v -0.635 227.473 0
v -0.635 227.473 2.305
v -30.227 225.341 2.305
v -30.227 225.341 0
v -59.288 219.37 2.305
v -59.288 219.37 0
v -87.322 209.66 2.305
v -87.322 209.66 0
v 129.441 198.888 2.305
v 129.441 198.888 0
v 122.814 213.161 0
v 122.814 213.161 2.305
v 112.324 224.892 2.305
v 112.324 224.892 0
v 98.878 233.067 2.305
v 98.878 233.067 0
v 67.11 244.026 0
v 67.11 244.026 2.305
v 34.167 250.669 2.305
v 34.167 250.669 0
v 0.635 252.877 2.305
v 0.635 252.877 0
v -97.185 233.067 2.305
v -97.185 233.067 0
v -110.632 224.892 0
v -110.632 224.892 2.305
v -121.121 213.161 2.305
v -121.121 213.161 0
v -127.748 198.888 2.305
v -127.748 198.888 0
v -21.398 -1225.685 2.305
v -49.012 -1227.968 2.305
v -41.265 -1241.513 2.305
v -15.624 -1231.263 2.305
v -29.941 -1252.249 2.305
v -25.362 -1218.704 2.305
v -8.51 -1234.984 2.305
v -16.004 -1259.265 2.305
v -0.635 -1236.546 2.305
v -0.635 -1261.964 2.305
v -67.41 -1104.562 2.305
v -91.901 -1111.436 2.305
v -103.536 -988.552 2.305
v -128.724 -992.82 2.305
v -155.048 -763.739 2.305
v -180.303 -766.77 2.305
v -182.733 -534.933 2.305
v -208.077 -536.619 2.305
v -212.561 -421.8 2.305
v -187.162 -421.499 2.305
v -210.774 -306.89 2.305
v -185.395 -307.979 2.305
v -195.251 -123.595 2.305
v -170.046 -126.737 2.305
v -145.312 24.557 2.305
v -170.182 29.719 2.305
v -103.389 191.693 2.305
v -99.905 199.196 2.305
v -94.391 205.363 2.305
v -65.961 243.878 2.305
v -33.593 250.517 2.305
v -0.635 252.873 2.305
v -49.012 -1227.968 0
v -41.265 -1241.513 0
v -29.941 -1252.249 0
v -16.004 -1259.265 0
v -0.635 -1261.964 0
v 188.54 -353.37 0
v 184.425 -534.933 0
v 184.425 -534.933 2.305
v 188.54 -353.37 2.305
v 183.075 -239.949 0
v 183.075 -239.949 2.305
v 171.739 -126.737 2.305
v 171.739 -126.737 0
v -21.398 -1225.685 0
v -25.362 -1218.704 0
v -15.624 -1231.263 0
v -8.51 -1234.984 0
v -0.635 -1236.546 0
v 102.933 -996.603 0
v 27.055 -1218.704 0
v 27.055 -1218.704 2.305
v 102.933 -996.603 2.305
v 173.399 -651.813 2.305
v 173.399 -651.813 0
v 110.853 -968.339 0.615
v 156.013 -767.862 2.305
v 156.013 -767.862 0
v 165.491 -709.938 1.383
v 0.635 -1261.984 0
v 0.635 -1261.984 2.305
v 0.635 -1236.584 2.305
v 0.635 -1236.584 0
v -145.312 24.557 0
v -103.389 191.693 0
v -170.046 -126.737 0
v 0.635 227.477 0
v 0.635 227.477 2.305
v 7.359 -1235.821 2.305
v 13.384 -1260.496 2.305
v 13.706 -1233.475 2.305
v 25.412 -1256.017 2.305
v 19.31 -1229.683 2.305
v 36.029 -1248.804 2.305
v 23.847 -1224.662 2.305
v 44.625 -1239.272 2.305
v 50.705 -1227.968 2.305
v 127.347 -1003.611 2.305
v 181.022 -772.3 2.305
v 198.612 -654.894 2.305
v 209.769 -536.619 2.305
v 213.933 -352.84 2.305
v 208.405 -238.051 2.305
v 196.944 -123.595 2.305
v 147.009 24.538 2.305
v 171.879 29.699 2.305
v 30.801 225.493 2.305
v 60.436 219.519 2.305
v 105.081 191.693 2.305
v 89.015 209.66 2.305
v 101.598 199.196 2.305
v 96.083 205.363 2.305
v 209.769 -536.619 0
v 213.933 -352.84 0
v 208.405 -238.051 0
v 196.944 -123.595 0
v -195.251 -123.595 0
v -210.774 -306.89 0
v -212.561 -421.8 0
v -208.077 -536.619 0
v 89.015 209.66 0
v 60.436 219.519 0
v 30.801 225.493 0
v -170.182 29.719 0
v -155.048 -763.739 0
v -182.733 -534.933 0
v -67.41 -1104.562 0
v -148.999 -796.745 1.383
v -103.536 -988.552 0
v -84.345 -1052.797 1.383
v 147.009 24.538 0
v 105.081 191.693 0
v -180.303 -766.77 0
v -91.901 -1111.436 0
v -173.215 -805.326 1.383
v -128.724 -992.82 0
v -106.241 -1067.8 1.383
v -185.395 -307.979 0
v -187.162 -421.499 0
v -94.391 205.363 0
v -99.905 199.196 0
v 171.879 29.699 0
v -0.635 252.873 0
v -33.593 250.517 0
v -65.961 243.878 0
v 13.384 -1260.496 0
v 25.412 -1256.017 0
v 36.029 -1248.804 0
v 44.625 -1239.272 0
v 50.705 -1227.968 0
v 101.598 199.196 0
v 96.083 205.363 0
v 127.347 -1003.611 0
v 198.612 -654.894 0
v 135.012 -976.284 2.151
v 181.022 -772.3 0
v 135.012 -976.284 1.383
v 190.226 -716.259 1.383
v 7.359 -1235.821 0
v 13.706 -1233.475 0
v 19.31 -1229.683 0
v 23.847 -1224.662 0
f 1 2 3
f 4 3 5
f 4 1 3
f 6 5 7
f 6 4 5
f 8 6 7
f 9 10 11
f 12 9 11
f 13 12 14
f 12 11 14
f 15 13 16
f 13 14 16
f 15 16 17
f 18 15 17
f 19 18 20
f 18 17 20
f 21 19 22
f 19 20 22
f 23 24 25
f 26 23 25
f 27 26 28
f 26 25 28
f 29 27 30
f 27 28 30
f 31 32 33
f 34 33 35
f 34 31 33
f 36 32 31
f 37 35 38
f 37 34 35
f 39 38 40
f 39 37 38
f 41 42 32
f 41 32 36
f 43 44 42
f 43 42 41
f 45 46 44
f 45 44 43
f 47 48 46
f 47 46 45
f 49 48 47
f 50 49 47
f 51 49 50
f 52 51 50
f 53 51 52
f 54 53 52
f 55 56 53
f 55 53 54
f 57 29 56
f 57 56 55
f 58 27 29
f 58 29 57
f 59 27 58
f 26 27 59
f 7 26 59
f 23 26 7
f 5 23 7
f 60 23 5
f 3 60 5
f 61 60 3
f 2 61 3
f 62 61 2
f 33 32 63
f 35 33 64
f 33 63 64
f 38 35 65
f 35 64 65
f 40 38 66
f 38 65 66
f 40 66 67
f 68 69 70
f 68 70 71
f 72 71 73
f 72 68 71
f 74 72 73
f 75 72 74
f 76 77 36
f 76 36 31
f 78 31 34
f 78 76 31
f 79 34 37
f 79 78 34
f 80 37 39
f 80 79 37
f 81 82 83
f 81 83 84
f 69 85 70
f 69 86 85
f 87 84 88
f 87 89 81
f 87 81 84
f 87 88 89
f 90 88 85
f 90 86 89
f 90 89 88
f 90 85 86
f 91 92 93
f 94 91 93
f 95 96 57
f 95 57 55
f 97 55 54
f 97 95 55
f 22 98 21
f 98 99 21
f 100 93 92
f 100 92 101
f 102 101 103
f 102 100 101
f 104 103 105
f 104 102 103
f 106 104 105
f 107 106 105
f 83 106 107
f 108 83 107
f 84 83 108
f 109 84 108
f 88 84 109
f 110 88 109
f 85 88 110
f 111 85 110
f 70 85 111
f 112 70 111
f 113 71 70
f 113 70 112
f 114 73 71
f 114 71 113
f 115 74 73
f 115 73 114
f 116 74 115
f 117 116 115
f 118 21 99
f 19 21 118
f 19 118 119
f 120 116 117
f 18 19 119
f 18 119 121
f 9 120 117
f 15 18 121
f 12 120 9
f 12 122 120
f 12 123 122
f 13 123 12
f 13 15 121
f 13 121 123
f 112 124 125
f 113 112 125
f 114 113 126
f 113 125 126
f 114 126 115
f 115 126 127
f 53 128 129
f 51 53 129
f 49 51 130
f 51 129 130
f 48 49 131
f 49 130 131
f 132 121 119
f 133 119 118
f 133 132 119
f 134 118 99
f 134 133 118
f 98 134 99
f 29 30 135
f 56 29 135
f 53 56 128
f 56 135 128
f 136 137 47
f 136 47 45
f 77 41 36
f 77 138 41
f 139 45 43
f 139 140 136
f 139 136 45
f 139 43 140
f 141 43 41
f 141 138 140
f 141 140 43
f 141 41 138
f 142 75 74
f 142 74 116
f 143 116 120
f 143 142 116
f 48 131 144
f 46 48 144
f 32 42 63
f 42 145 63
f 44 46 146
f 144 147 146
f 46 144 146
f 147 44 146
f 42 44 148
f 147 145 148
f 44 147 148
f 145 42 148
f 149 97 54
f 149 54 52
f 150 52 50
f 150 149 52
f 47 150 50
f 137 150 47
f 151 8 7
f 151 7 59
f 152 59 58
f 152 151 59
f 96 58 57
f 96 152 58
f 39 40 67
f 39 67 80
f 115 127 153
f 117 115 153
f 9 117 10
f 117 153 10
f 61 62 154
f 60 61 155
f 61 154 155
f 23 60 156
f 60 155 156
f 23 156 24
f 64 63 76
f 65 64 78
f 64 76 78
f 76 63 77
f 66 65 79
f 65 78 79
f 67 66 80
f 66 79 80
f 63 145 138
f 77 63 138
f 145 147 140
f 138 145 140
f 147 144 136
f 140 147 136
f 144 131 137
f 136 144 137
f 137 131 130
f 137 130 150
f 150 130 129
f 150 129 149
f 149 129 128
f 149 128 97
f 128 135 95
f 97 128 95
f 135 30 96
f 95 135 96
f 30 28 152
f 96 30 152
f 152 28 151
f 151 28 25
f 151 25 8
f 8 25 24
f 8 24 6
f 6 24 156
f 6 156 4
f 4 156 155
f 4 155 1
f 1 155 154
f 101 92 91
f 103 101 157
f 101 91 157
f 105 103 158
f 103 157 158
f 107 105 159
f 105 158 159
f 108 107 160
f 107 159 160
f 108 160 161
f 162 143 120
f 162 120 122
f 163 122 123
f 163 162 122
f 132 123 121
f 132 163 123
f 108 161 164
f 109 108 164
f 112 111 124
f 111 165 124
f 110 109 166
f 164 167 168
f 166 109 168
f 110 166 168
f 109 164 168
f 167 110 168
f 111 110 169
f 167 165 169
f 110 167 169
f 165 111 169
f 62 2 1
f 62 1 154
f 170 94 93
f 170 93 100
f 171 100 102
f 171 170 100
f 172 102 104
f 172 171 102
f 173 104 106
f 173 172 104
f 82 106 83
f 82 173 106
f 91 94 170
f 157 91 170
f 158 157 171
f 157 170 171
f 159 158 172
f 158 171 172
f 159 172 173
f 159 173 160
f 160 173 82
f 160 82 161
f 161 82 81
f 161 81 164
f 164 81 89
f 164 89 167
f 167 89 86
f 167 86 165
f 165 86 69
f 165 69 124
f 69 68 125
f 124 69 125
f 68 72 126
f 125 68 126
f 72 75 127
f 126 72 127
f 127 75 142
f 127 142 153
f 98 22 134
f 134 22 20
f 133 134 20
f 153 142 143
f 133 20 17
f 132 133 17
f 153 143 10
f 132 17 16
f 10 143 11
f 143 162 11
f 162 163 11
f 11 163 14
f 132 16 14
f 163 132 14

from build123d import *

# Parameters (mm, degrees)
BOSS_EXTRUDE1_DEPTH = 2.304796
SKETCH2_W           = 1.27
SKETCH2_H           = 1514.862147185
CUT_EXTRUDE1_DEPTH  = 1281.069351502


with BuildPart() as part:
    # Sketch1 → Boss-Extrude1 (new body)
    with BuildSketch(Plane.XY):
        with BuildLine():
            ThreePointArc((-49.012476183, -1227.968491723), (0.846271763, -1261.984788161), (50.705019709, -1227.968491723))
            add(Edge.make_bspline(
                [(50.705019709, -1227.968491723), (50.876541485, -1227.530644592), (52.36331753, -1223.733048391), (55.210726992, -1216.415811635), (59.247291668, -1206.0006738), (67.337886034, -1184.945972411), (79.108904217, -1153.275459712), (93.993799852, -1110.698512309), (112.759736252, -1053.563986738), (134.195553597, -981.438188519), (152.857780036, -908.462427511), (166.041693988, -849.678207818), (178.063122018, -790.572711444), (190.83744454, -716.338277578), (200.552937094, -641.705100049), (206.448473168, -581.748781993), (208.768724854, -551.664603861), (209.769442798, -536.618687959)],
                knots=[0, 0, 0, 0, 0.00195258, 0.016937234, 0.032557875, 0.048178516, 0.11066108, 0.173143643, 0.235626207, 0.360591334, 0.485556462, 0.548039025, 0.610521589, 0.735486716, 0.860451843, 0.922934407, 0.985416971, 0.985416971, 0.985416971, 0.985416971], degree=3))
            add(Edge.make_bspline(
                [(209.769442798, -536.618687959), (211.022785934, -517.774670682), (213.015154655, -480.045210541), (214.979203287, -404.551394934), (213.887978686, -328.957247078), (209.759366173, -253.547846613), (205.182331515, -197.02091496), (200.609734071, -153.721383907), (197.651535298, -129.273131339), (196.943639376, -123.594731745)],
                knots=[0.54023228, 0.54023228, 0.54023228, 0.54023228, 0.602347455, 0.664462629, 0.788692977, 0.850808151, 0.912923325, 0.975038499, 0.993842785, 0.993842785, 0.993842785, 0.993842785], degree=3))
            add(Edge.make_bspline(
                [(196.943639376, -123.594731745), (195.313181288, -110.515983509), (191.080146378, -78.718212884), (183.283897421, -28.376345026), (174.50909818, 17.839855462), (166.530923366, 54.667671174), (160.119972002, 82.252196411), (153.387950608, 109.867348445), (146.433800478, 137.436973344), (139.218665538, 164.814576611), (133.773055793, 184.09972107), (130.453314003, 195.45309398), (129.775305463, 197.755615438), (129.440861548, 198.887948289)],
                knots=[0.178448911, 0.178448911, 0.178448911, 0.178448911, 0.221759799, 0.283874973, 0.345990147, 0.377047734, 0.408105321, 0.439162908, 0.470220495, 0.501278082, 0.532335669, 0.536350082, 0.54023228, 0.54023228, 0.54023228, 0.54023228], degree=3))
            ThreePointArc((129.440861548, 198.887948289), (118.002457463, 219.414249941), (98.877648319, 233.067374959))
            ThreePointArc((98.877648319, 233.067374959), (0.846271763, 252.877447424), (-97.185104793, 233.067374959))
            ThreePointArc((-97.185104793, 233.067374959), (-116.309913937, 219.414249941), (-127.748318022, 198.887948289))
            add(Edge.make_bspline(
                [(-127.748318022, 198.887948289), (-128.082761937, 197.755615438), (-128.760770477, 195.45309398), (-132.080512266, 184.09972107), (-137.526122011, 164.814576611), (-144.741256951, 137.436973344), (-151.695407081, 109.867348445), (-158.427428476, 82.252196411), (-164.83837984, 54.667671174), (-172.816554654, 17.839855462), (-181.591353895, -28.376345026), (-189.387602851, -78.718212884), (-193.620637762, -110.515983509), (-195.251095849, -123.594731745)],
                knots=[0.178448911, 0.178448911, 0.178448911, 0.178448911, 0.182331109, 0.186345522, 0.217403109, 0.248460696, 0.279518283, 0.31057587, 0.341633458, 0.372691045, 0.434806219, 0.496921393, 0.54023228, 0.54023228, 0.54023228, 0.54023228], degree=3))
            add(Edge.make_bspline(
                [(-195.251095849, -123.594731745), (-195.958991771, -129.273131339), (-198.917190544, -153.721383907), (-203.489787989, -197.02091496), (-208.066822647, -253.547846613), (-212.19543516, -328.957247078), (-213.28665976, -404.551394934), (-211.322611129, -480.045210541), (-209.330242407, -517.774670682), (-208.076899272, -536.618687959)],
                knots=[0.54023228, 0.54023228, 0.54023228, 0.54023228, 0.559036567, 0.621151741, 0.683266915, 0.745382089, 0.869612437, 0.931727611, 0.993842785, 0.993842785, 0.993842785, 0.993842785], degree=3))
            add(Edge.make_bspline(
                [(-208.076899272, -536.618687959), (-207.076181328, -551.664603861), (-204.755929642, -581.748781993), (-198.860393568, -641.705100049), (-189.144901014, -716.338277578), (-176.370578492, -790.572711444), (-164.349150462, -849.678207818), (-151.165236509, -908.462427511), (-132.503010071, -981.438188519), (-111.067192726, -1053.563986738), (-92.301256326, -1110.698512309), (-77.416360691, -1153.275459712), (-65.645342508, -1184.945972411), (-57.554748142, -1206.0006738), (-53.518183465, -1216.415811635), (-50.670774003, -1223.733048391), (-49.183997958, -1227.530644592), (-49.012476183, -1227.968491723)],
                knots=[0, 0, 0, 0, 0.062482564, 0.124965127, 0.249930255, 0.374895382, 0.437377946, 0.499860509, 0.624825637, 0.749790764, 0.812273328, 0.874755891, 0.937238455, 0.952859096, 0.968479737, 0.983464391, 0.985416971, 0.985416971, 0.985416971, 0.985416971], degree=3))
        make_face()
        with BuildLine():
            ThreePointArc((-25.362399167, -1218.703835381), (0.846271763, -1236.584788161), (27.054942693, -1218.703835381))
            add(Edge.make_bspline(
                [(27.054942693, -1218.703835381), (28.400217106, -1215.269725977), (31.071527006, -1208.410261533), (36.438744963, -1194.570757623), (42.985240683, -1177.47065912), (50.654706246, -1156.86494819), (60.615251709, -1129.323026418), (72.583624331, -1094.676579393), (90.695710655, -1038.897350426), (111.388508474, -968.495707326), (129.401415384, -897.311669678), (142.129404955, -839.985670396), (153.737986392, -782.359777703), (166.079144877, -710.010906133), (175.478922652, -637.295429512), (181.195138388, -578.89126959), (183.45070388, -549.588282457), (184.425439017, -534.933021219)],
                knots=[0, 0, 0, 0, 0.01539714, 0.030794281, 0.061588562, 0.092382843, 0.123177124, 0.184765685, 0.246354247, 0.369531371, 0.492708495, 0.554297056, 0.615885618, 0.739062742, 0.862239865, 0.923828427, 0.985416989, 0.985416989, 0.985416989, 0.985416989], degree=3))
            add(Edge.make_bspline(
                [(184.425439017, -534.933021219), (186.685591164, -500.951627859), (189.524526931, -432.872907401), (188.778905417, -330.633361226), (182.988482095, -228.610193148), (175.9618181, -160.612367611), (171.7387425, -126.736892387)],
                knots=[0.54023228, 0.54023228, 0.54023228, 0.54023228, 0.653634907, 0.767037533, 0.880440159, 0.993842785, 0.993842785, 0.993842785, 0.993842785], degree=3))
            add(Edge.make_bspline(
                [(171.7387425, -126.736892387), (170.055397257, -113.233908903), (166.451057758, -86.235371304), (160.322918197, -45.970354742), (153.28834279, -6.080764228), (145.25715691, 33.578532738), (137.730400326, 66.60521796), (131.32525971, 93.168196548), (126.380227886, 113.122171485), (121.322734312, 132.999041364), (116.143154484, 152.69872086), (111.658558519, 168.954283037), (107.94481502, 181.937664809), (106.040479885, 188.445175846), (105.081174829, 191.693112438)],
                knots=[0.178448911, 0.178448911, 0.178448911, 0.178448911, 0.223671832, 0.268894753, 0.314117675, 0.359340596, 0.404563517, 0.427174977, 0.449786438, 0.472397899, 0.495009359, 0.51762082, 0.52892655, 0.54023228, 0.54023228, 0.54023228, 0.54023228], degree=3))
            ThreePointArc((105.081174829, 191.693112438), (99.0682696, 202.483315828), (89.0147985, 209.660448774))
            ThreePointArc((89.0147985, 209.660448774), (0.846271763, 227.477447424), (-87.322254974, 209.660448774))
            ThreePointArc((-87.322254974, 209.660448774), (-97.375726074, 202.483315828), (-103.388631302, 191.693112438))
            add(Edge.make_bspline(
                [(-103.388631302, 191.693112438), (-104.347936358, 188.445175846), (-106.252271493, 181.937664809), (-109.966014993, 168.954283037), (-114.450610958, 152.69872086), (-119.630190785, 132.999041364), (-124.68768436, 113.122171485), (-129.632716184, 93.168196548), (-136.037856799, 66.60521796), (-143.564613383, 33.578532738), (-151.595799264, -6.080764228), (-158.630374671, -45.970354742), (-164.758514232, -86.235371304), (-168.362853731, -113.233908903), (-170.046198974, -126.736892387)],
                knots=[0.178448911, 0.178448911, 0.178448911, 0.178448911, 0.189754641, 0.201060372, 0.223671832, 0.246283293, 0.268894753, 0.291506214, 0.314117675, 0.359340596, 0.404563517, 0.449786438, 0.495009359, 0.54023228, 0.54023228, 0.54023228, 0.54023228], degree=3))
            add(Edge.make_bspline(
                [(-170.046198974, -126.736892387), (-174.269274574, -160.612367611), (-181.295938569, -228.610193148), (-187.086361891, -330.633361226), (-187.831983404, -432.872907401), (-184.993047638, -500.951627859), (-182.732895491, -534.93302122)],
                knots=[0.54023228, 0.54023228, 0.54023228, 0.54023228, 0.653634907, 0.767037533, 0.880440159, 0.993842785, 0.993842785, 0.993842785, 0.993842785], degree=3))
            add(Edge.make_bspline(
                [(-182.732895491, -534.93302122), (-181.758160354, -549.588282457), (-179.502594861, -578.89126959), (-173.786379125, -637.295429512), (-164.386601351, -710.010906133), (-152.045442866, -782.359777703), (-140.436861429, -839.985670396), (-127.708871858, -897.311669678), (-109.695964947, -968.495707326), (-89.003167129, -1038.897350426), (-70.891080805, -1094.676579393), (-58.922708183, -1129.323026418), (-48.96216272, -1156.86494819), (-41.292697157, -1177.47065912), (-34.746201437, -1194.570757623), (-29.378983479, -1208.410261533), (-26.70767358, -1215.269725977), (-25.362399167, -1218.703835381)],
                knots=[-1.8e-08, -1.8e-08, -1.8e-08, -1.8e-08, 0.061588543, 0.123177105, 0.246354229, 0.369531353, 0.431119914, 0.492708476, 0.6158856, 0.739062723, 0.800651285, 0.862239847, 0.893034128, 0.923828409, 0.95462269, 0.97001983, 0.985416971, 0.985416971, 0.985416971, 0.985416971], degree=3))
        make_face(mode=Mode.SUBTRACT)
    extrude(amount=BOSS_EXTRUDE1_DEPTH)

    # Sketch2 → Cut-Extrude1 (cut, through all)
    with BuildSketch(Plane.XY.offset(2.304796)):
        with Locations((0, -504.553714569)):
            Rectangle(SKETCH2_W, SKETCH2_H)
    extrude(amount=-CUT_EXTRUDE1_DEPTH, mode=Mode.SUBTRACT)


with BuildPart() as cut_extrude1_piece_1:
    # of the separate pieces the step leaves, piece 1, a body of its own (cut_extrude1_pieces)
    add(part.part.solids().sort_by_distance((98.877648319, 233.067374959, 0))[0])


with BuildPart() as cut_extrude1_piece_2:
    # of the separate pieces the step leaves, piece 2, a body of its own (cut_extrude1_pieces)
    add(part.part.solids().sort_by_distance((-97.185104793, 233.067374959, 0))[0])


solid = Compound([cut_extrude1_piece_1.part, cut_extrude1_piece_2.part])
